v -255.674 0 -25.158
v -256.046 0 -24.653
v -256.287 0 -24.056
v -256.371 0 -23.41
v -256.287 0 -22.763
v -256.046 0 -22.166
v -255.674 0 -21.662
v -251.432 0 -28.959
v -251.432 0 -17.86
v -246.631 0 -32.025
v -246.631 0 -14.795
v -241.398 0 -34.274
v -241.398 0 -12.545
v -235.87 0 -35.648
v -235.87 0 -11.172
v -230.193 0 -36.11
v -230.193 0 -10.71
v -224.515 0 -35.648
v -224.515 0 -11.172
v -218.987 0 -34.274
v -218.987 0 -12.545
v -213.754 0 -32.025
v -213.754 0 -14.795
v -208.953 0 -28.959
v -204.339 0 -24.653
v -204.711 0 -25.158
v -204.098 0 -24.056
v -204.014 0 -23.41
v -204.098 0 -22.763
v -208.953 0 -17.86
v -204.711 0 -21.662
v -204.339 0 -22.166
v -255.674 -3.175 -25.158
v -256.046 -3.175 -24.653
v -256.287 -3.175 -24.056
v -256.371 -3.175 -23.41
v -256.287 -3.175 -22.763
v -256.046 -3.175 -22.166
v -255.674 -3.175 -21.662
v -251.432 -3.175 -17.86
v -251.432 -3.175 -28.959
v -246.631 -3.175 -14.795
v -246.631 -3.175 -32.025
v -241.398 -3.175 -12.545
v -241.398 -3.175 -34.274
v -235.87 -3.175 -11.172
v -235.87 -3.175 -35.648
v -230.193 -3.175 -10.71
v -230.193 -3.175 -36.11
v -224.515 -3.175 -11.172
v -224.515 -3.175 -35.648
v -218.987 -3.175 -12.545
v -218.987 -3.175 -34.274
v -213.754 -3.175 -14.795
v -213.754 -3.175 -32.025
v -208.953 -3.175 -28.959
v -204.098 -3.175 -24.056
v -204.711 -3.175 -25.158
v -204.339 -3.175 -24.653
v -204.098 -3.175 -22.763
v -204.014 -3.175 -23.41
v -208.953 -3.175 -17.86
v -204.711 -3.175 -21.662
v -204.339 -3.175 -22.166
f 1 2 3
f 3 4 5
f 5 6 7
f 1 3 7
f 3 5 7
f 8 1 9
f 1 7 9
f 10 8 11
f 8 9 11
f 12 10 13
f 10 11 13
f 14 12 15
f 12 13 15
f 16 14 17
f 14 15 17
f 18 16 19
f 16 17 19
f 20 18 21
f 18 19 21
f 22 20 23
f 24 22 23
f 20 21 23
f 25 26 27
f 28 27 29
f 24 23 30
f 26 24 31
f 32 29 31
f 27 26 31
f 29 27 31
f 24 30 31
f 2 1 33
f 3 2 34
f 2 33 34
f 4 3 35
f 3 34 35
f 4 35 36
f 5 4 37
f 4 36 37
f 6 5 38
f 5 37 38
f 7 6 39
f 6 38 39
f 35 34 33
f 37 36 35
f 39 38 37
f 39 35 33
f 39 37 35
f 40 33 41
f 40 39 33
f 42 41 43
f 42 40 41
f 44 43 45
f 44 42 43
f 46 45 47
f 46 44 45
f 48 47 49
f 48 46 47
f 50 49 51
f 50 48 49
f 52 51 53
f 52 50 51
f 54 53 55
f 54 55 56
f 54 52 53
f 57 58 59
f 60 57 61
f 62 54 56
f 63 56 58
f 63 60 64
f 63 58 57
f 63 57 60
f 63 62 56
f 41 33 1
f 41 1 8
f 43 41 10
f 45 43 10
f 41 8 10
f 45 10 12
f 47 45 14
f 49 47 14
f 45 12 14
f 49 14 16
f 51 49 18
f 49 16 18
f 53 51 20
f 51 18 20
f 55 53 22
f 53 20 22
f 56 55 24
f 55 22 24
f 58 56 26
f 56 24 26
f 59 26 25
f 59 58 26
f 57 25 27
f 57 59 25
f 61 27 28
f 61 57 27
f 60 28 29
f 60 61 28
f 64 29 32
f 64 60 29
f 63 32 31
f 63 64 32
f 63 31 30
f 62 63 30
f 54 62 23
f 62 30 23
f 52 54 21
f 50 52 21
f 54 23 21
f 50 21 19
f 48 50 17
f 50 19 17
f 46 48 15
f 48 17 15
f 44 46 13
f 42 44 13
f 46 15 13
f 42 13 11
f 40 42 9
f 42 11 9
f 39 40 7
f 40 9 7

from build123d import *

# Parameters (mm, degrees)
F1_DEPTH = 3.175
F2_R     = 2.54
F3_R     = 2.54


with BuildPart() as f1:
    # F0 (on Front) → F1 (new body)
    with BuildSketch(Plane.XZ):
        with BuildLine():
            ThreePointArc((-257.224470377, -23.4096460044), (-230.192520377, -36.1096460044), (-203.160570377, -23.4096460044))
            ThreePointArc((-203.160570377, -23.4096460044), (-230.192520377, -10.7096460044), (-257.224470377, -23.4096460044))
        make_face()
    extrude(amount=F1_DEPTH)

    # F2
    f2_edges = [f1.edges().sort_by_distance(p)[0] for p in [
        (-203.16057, -1.5875, -23.409646),
    ]]
    fillet(f2_edges, radius=F2_R)

    # F3
    f3_edges = [f1.edges().sort_by_distance(p)[0] for p in [
        (-257.22447, -1.5875, -23.409646),
    ]]
    fillet(f3_edges, radius=F3_R)


solid = f1.part
